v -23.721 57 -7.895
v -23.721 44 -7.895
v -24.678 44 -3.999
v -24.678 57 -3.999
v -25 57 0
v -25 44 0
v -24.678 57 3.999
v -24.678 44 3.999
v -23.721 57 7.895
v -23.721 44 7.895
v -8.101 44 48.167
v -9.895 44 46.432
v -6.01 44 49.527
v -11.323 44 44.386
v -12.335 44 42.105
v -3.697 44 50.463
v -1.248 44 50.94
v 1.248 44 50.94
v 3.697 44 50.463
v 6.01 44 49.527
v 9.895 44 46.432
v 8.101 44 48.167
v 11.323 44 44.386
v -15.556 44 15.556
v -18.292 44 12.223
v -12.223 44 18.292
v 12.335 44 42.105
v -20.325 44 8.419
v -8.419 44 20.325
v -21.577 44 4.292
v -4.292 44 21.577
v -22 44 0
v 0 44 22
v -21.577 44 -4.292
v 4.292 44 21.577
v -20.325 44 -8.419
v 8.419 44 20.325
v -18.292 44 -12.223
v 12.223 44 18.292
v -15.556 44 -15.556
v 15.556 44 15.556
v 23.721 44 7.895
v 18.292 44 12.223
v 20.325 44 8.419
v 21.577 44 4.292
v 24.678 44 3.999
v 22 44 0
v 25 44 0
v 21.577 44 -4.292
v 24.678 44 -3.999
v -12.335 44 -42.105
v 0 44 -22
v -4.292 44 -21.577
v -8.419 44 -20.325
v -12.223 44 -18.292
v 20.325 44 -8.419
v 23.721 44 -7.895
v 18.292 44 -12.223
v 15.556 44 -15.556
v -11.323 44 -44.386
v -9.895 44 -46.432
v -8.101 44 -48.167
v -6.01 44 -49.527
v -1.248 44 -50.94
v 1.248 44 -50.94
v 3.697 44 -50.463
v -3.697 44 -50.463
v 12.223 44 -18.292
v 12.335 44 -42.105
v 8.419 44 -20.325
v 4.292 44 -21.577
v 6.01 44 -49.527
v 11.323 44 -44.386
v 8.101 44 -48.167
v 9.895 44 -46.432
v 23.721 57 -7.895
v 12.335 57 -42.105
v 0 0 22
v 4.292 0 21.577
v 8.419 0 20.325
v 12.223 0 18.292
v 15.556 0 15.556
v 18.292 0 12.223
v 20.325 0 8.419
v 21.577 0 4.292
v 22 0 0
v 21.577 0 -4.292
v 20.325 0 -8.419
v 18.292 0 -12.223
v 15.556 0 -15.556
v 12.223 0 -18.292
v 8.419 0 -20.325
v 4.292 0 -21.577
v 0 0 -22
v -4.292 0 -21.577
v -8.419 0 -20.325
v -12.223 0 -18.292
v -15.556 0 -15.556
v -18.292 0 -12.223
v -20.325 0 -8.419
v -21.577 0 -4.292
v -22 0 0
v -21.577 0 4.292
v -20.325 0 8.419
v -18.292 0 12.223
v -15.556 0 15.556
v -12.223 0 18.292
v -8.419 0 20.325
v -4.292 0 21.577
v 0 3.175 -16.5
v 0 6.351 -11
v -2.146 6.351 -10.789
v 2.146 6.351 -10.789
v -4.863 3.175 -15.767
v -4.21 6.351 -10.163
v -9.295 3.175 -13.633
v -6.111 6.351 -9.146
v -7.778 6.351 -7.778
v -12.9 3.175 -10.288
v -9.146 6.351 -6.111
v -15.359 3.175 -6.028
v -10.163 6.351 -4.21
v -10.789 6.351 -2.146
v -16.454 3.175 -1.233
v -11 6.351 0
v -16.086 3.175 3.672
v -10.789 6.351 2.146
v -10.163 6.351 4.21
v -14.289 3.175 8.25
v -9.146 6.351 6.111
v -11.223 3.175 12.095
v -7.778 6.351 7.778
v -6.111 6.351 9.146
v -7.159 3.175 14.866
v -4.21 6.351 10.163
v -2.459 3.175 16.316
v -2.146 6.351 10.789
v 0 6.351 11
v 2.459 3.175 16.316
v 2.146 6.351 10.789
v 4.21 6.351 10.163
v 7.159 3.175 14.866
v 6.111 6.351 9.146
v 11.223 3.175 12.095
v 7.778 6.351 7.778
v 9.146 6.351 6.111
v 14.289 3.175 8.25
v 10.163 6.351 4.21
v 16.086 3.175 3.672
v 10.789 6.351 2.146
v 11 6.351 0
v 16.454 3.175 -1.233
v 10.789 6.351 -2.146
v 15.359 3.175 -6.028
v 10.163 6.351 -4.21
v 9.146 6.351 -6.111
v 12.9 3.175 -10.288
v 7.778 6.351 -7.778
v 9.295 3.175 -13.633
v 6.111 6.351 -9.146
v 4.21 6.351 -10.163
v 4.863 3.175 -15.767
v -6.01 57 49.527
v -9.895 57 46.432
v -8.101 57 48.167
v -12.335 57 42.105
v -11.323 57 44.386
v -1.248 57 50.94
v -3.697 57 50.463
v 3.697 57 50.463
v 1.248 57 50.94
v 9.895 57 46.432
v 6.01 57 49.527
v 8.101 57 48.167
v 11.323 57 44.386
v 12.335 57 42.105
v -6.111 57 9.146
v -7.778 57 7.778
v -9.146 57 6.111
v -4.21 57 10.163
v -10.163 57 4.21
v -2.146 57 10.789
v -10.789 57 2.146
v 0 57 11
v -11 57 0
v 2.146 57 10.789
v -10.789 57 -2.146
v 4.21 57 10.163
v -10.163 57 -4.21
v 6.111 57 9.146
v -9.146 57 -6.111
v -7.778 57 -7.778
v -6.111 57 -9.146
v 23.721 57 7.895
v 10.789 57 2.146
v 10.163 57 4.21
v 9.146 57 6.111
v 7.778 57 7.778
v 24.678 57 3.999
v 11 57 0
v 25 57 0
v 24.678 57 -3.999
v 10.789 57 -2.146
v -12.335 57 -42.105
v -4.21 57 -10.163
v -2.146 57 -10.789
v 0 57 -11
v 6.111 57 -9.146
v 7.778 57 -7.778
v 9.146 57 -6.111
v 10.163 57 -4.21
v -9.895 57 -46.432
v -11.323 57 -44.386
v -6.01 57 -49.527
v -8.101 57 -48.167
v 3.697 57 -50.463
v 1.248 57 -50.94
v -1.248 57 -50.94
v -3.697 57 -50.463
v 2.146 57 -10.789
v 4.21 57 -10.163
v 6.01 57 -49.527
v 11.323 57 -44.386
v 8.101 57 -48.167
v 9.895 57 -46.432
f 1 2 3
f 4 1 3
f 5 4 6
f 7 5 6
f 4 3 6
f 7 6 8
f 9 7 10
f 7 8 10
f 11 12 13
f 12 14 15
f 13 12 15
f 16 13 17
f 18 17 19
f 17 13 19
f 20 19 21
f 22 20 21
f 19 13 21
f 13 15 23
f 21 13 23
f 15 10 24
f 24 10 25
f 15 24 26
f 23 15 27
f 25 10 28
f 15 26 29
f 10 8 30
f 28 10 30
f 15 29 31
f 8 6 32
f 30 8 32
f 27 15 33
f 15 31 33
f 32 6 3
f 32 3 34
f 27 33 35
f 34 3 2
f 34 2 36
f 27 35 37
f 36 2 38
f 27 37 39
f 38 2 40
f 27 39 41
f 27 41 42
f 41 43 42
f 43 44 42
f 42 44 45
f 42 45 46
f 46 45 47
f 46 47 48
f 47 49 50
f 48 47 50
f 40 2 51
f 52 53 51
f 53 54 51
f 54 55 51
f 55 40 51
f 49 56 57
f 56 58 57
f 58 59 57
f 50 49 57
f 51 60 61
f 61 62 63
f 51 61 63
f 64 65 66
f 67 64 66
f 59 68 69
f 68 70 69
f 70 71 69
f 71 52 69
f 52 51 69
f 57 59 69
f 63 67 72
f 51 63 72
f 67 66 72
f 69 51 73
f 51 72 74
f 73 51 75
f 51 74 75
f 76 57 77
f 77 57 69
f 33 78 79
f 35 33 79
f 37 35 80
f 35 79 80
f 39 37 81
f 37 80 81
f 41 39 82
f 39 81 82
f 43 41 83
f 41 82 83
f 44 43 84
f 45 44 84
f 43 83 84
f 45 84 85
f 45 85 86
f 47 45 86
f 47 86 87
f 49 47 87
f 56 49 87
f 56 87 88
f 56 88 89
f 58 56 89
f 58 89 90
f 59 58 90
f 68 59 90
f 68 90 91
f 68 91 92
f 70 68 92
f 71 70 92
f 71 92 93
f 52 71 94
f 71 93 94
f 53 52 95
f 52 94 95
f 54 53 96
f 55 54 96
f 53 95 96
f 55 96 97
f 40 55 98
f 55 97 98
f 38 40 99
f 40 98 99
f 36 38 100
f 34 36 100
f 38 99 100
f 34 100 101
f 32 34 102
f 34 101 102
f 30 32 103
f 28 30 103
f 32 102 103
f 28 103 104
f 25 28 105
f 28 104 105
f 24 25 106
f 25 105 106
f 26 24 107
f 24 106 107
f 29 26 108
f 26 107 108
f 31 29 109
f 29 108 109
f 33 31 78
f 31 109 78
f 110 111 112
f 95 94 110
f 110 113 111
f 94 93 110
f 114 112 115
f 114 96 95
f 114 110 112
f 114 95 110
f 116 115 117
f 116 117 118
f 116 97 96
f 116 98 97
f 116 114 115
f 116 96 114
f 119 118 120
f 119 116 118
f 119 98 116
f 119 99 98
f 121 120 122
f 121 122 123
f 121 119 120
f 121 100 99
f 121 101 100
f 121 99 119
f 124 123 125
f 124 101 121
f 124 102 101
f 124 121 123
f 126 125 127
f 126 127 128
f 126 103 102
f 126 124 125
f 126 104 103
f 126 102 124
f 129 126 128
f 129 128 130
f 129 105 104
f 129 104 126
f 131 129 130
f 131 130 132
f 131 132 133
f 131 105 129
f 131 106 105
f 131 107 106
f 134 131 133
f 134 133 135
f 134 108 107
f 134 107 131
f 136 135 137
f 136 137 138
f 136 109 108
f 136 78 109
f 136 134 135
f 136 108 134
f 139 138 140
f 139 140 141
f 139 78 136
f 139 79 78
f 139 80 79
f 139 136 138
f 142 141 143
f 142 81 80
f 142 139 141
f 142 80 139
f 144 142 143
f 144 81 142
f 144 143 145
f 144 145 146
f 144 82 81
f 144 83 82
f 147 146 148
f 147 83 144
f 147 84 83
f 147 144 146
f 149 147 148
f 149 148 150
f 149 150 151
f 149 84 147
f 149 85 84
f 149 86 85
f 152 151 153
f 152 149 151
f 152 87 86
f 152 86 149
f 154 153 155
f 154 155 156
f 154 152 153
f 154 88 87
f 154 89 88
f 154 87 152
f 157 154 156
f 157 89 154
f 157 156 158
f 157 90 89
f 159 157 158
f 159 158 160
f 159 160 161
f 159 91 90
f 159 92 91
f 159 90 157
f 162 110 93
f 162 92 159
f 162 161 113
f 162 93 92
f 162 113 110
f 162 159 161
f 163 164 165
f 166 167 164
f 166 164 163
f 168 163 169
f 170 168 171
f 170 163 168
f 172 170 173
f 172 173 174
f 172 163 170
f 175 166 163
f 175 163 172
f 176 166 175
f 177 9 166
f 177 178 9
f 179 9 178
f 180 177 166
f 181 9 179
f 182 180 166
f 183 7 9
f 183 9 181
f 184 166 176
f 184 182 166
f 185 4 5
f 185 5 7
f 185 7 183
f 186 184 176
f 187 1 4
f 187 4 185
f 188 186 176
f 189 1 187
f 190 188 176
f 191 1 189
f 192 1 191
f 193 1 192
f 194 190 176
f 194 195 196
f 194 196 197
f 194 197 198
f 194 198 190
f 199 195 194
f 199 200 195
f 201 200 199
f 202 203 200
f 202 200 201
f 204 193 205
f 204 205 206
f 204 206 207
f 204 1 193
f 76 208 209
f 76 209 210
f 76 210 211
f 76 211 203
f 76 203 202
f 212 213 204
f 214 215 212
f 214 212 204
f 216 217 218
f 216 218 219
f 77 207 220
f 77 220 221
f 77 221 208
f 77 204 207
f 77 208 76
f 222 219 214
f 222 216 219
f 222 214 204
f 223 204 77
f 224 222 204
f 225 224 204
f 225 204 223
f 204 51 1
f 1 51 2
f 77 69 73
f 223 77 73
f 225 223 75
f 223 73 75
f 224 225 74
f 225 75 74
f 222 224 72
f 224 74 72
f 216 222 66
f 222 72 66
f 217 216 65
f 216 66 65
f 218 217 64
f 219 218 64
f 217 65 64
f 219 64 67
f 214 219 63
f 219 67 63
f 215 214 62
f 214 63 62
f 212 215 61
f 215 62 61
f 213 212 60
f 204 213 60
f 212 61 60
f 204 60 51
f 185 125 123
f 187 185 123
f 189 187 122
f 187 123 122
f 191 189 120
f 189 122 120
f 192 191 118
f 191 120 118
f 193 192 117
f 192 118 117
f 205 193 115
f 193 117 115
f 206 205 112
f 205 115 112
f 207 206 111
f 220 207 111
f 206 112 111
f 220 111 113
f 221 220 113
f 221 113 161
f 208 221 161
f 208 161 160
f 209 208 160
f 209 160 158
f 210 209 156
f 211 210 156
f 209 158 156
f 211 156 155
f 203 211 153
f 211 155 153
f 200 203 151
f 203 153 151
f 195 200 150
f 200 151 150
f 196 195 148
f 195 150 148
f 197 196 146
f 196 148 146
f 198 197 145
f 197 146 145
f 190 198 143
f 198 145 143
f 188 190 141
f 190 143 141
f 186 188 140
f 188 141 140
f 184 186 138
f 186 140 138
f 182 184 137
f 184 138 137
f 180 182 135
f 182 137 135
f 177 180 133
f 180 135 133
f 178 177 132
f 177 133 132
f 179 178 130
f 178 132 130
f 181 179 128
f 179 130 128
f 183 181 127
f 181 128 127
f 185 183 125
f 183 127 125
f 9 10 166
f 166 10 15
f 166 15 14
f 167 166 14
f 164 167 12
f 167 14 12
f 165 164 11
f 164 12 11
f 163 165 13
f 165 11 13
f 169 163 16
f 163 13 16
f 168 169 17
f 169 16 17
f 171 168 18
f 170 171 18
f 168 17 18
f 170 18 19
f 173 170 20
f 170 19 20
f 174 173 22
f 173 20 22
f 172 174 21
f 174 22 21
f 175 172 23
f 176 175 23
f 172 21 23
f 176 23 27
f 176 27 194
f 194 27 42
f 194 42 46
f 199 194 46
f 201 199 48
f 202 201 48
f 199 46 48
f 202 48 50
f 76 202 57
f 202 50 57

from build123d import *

# Parameters (mm, degrees)
SKETCH1_R           = 22
BOSS_EXTRUDE1_DEPTH = 44
BOSS_EXTRUDE2_DEPTH = 13
HOLE1_D             = 22


with BuildPart() as part:
    # Sketch1 → Boss-Extrude1 (new body)
    with BuildSketch(Plane(origin=(0, 0, 0), x_dir=(1, 0, 0), z_dir=(0, 1, 0))):
        with Locations(Location((0, 0, 0), (0, 0, 270))):
            Circle(SKETCH1_R)
    extrude(amount=BOSS_EXTRUDE1_DEPTH)

    # Sketch2 → Boss-Extrude2 (add)
    with BuildSketch(Plane(origin=(0, 44, 0), x_dir=(1, 0, 0), z_dir=(0, 1, 0))):
        with BuildLine():
            Line((-12.334780679, 42.105263158), (-23.720732075, 7.894736842))
            ThreePointArc((-23.720732075, 7.894736842), (-25, 0), (-23.720732075, -7.894736842))
            Line((-23.720732075, -7.894736842), (-12.334780679, -42.105263158))
            ThreePointArc((-12.334780679, -42.105263158), (0, -51), (12.334780679, -42.105263158))
            Line((12.334780679, -42.105263158), (23.720732075, -7.894736842))
            ThreePointArc((23.720732075, -7.894736842), (25, 0), (23.720732075, 7.894736842))
            Line((23.720732075, 7.894736842), (12.334780679, 42.105263158))
            ThreePointArc((12.334780679, 42.105263158), (0, 51), (-12.334780679, 42.105263158))
        make_face()
    extrude(amount=BOSS_EXTRUDE2_DEPTH)

    # Hole1 (through all)
    with Locations(Plane(origin=(0, 57, 0), x_dir=(1, 0, 0), z_dir=(0, 1, 0))):
        with Locations((0, 0)):
            Hole(HOLE1_D / 2)

    # Sketch5 → Cut-Revolve1 (revolve, cut)
    with BuildSketch(Plane(origin=(0, 0, 0), x_dir=(0, 0, -1), z_dir=(1, 0, 0)), mode=Mode.PRIVATE) as cut_revolve1_sk:
        Polygon((0, 0), (0, 6.350852961), (-11, 6.350852961), (-22, 0), align=None)
    revolve(cut_revolve1_sk.sketch.rotate(Axis((0, 0, 0), (0, 1, 0)), 180), axis=Axis((0, 0, 0), (0, 1, 0)), mode=Mode.SUBTRACT)


solid = part.part
